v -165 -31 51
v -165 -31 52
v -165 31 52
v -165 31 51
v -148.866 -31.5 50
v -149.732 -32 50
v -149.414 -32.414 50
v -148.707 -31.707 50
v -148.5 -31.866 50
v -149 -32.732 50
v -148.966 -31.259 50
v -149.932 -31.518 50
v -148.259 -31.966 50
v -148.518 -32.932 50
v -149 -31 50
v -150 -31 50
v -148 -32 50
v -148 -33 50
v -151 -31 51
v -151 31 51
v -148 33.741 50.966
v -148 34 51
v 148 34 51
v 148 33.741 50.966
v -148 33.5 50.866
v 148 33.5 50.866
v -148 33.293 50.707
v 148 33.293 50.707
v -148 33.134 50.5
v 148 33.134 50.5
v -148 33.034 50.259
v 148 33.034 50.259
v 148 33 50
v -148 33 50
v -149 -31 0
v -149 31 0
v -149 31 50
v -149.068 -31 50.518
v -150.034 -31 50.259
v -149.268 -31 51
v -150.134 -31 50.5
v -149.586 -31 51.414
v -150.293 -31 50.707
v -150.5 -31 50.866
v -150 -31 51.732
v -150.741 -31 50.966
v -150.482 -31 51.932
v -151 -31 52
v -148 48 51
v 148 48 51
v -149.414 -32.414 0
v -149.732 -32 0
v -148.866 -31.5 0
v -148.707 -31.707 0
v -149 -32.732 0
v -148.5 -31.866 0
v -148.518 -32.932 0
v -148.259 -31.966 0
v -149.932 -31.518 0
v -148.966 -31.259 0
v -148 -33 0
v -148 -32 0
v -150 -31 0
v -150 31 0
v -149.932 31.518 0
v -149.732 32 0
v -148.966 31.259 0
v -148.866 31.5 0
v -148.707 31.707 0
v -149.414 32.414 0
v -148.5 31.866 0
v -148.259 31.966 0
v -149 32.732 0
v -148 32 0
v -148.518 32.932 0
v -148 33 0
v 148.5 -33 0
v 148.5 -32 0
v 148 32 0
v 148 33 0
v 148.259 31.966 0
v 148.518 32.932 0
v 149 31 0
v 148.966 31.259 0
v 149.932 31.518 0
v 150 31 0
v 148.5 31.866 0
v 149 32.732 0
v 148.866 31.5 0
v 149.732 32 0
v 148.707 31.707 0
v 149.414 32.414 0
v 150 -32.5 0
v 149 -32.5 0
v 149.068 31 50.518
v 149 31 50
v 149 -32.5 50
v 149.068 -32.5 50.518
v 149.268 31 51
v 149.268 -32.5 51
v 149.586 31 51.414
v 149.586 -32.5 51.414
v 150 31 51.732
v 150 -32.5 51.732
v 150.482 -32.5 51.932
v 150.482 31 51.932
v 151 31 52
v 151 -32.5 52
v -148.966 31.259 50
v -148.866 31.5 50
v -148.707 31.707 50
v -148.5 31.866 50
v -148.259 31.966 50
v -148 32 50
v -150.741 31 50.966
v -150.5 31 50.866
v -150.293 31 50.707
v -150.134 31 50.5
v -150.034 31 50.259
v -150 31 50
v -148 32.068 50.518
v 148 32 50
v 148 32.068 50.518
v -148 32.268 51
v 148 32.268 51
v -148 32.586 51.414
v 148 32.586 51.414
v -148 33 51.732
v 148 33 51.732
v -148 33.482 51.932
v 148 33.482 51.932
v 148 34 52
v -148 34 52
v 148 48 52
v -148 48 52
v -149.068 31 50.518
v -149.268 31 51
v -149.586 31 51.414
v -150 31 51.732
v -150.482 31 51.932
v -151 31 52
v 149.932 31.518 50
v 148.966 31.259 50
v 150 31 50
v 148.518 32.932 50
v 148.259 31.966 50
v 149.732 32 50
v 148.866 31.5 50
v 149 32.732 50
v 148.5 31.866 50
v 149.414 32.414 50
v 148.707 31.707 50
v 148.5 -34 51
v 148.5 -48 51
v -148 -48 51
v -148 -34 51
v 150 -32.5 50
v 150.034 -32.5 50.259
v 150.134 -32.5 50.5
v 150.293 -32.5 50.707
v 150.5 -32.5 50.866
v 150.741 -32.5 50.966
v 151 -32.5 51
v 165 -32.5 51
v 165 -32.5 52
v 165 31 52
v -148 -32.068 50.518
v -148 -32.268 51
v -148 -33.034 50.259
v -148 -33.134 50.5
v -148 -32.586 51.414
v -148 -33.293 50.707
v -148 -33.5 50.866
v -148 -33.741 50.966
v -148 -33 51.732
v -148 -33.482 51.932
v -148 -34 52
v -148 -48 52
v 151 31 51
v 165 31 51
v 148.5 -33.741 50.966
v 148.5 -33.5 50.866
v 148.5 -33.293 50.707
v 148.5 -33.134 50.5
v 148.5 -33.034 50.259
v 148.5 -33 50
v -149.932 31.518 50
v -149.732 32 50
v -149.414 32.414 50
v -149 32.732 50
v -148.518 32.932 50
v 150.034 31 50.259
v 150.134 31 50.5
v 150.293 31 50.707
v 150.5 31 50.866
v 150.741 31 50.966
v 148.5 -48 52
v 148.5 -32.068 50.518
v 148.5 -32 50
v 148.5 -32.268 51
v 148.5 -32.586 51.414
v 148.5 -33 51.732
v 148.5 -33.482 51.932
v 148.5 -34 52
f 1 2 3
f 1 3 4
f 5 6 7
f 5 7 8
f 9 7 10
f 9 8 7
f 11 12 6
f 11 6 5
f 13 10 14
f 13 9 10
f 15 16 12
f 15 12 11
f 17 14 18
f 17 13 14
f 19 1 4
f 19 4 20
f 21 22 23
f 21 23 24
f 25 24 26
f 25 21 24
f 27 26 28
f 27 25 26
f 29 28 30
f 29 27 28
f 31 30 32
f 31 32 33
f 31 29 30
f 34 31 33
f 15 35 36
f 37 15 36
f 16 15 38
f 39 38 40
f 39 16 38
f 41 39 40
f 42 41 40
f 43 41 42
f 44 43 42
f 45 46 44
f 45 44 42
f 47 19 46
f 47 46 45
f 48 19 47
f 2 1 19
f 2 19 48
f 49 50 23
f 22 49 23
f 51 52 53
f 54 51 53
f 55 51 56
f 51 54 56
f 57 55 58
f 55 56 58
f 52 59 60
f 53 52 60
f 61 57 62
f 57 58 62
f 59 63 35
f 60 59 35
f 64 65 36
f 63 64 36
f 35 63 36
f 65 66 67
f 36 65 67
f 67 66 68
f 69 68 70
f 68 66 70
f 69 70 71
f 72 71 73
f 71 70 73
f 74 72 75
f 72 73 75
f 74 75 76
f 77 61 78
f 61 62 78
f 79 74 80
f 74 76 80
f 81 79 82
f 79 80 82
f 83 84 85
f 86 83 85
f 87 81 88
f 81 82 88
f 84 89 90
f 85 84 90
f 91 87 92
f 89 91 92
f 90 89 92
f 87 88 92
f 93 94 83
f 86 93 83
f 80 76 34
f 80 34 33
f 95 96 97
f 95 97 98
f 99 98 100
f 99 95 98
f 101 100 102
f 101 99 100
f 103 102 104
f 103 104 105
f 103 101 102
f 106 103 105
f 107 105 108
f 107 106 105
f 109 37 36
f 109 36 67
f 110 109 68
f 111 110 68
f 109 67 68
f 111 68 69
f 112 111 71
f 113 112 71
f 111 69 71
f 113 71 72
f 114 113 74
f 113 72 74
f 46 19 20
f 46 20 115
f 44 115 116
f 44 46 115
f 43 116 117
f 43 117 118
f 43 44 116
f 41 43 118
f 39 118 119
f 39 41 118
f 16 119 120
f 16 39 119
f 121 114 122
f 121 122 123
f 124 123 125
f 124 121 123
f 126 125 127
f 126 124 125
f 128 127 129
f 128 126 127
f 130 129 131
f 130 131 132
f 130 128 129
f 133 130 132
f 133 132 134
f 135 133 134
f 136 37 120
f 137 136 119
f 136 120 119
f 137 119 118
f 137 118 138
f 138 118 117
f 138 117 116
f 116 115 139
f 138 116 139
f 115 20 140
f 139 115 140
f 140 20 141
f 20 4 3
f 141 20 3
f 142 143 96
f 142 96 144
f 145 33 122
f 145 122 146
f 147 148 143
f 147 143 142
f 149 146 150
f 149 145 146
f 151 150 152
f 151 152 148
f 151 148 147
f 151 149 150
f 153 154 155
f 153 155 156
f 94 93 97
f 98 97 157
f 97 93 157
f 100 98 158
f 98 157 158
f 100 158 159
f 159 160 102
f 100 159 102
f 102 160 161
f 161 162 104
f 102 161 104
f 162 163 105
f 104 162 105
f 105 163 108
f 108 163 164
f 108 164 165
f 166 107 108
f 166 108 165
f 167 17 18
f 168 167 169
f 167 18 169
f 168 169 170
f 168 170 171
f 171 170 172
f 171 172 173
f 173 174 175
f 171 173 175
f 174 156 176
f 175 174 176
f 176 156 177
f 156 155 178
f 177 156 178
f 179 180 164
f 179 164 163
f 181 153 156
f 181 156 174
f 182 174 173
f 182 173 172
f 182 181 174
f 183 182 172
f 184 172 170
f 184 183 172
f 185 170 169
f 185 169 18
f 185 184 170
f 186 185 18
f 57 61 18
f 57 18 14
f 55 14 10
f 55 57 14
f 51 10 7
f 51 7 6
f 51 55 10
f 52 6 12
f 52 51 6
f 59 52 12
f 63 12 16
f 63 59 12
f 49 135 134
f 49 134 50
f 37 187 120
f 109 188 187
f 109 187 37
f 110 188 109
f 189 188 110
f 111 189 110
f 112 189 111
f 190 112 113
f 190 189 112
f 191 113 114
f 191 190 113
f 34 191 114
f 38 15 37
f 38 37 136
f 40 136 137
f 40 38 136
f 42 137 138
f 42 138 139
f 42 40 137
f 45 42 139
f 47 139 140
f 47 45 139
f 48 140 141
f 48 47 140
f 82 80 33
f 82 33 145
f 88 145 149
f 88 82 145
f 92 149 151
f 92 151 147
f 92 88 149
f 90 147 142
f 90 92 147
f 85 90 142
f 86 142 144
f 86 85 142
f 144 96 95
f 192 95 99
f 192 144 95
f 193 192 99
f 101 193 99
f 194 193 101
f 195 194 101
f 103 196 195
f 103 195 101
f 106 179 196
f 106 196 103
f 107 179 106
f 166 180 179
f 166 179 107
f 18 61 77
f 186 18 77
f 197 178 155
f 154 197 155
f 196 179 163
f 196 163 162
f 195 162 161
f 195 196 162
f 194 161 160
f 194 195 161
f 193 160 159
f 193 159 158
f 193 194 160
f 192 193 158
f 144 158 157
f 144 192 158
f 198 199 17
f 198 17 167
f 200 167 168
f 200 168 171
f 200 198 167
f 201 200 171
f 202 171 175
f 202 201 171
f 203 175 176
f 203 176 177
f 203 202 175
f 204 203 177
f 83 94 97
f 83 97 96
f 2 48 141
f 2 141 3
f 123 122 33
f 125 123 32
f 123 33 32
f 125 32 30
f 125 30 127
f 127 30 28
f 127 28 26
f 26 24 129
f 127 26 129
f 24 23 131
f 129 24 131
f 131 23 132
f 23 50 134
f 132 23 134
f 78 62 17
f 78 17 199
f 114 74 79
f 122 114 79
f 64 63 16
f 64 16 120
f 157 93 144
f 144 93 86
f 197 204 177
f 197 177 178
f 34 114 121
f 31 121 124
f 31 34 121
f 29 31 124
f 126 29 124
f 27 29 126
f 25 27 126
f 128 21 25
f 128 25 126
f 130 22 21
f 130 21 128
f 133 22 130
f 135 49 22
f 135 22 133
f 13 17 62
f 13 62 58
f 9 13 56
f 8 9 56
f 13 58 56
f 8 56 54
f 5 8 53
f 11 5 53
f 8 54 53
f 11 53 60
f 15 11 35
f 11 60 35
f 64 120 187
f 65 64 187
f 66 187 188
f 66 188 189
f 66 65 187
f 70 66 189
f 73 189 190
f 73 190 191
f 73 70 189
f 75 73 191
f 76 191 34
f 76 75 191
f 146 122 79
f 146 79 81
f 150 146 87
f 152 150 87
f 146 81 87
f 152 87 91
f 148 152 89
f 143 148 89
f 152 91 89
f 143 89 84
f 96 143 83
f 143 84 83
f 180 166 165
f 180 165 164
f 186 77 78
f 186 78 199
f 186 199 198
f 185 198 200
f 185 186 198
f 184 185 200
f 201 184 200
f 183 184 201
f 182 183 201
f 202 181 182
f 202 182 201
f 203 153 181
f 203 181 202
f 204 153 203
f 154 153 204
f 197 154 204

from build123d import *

# Parameters (mm, degrees)
SKETCH1_W                 = 300
SKETCH1_H                 = 66
SKETCH1_W_2               = 298
SKETCH1_H_2               = 64
BOSS_EXTRUDE1_DEPTH       = 50
CONVERT_SOLID1_DEPTH      = 50
CONVERT_SOLID1_2_DEPTH    = 50
EDGE_FLANGE1_DEPTH        = 296
EDGE_FLANGE1_BEND_DEPTH   = 63.5
EDGE_FLANGE1_BEND_2_DEPTH = 296.5
EDGE_FLANGE1_BEND_3_DEPTH = 62


# Read off the part's stored shape, not the designer's step: Convert-Solid1
# Sheet-metal steps are written as plain solids
with BuildPart() as part:
    # Sketch1 → Boss-Extrude1 (new body)
    with BuildSketch(Plane.XY):
        Rectangle(SKETCH1_W, SKETCH1_H)
        Rectangle(SKETCH1_W_2, SKETCH1_H_2, mode=Mode.SUBTRACT)
    extrude(amount=BOSS_EXTRUDE1_DEPTH)

    # Convert-Solid1 outline → Convert-Solid1 (cut)
    with BuildSketch(Plane.XY):
        Polygon((149, -32.5), (149, -32), (148.5, -32), (148.5, -33), (150, -33), (150, -32.5), align=None)
        with BuildLine():
            ThreePointArc((148, 33), (149.414213562, 32.414213562), (150, 31))
            Line((150, 31), (150, 33))
            Line((150, 33), (148, 33))
        make_face()
        with BuildLine():
            Line((-150, -33), (-148, -33))
            ThreePointArc((-148, -33), (-149.414213562, -32.414213562), (-150, -31))
            Line((-150, -31), (-150, -33))
        make_face()
        with BuildLine():
            ThreePointArc((-150, 31), (-149.414213562, 32.414213562), (-148, 33))
            Line((-148, 33), (-150, 33))
            Line((-150, 33), (-150, 31))
        make_face()
    extrude(amount=CONVERT_SOLID1_DEPTH, mode=Mode.SUBTRACT)

    # Convert-Solid1 2 outline → Convert-Solid1 2 (add)
    with BuildSketch(Plane.XY):
        with BuildLine():
            ThreePointArc((148, 32), (148.707106781, 31.707106781), (149, 31))
            Line((149, 31), (149, 32))
            Line((149, 32), (148, 32))
        make_face()
        with BuildLine():
            ThreePointArc((-149, 31), (-148.707106781, 31.707106781), (-148, 32))
            Line((-148, 32), (-149, 32))
            Line((-149, 32), (-149, 31))
        make_face()
        with BuildLine():
            Line((-149, -32), (-148, -32))
            ThreePointArc((-148, -32), (-148.707106781, -31.707106781), (-149, -31))
            Line((-149, -31), (-149, -32))
        make_face()
    extrude(amount=CONVERT_SOLID1_2_DEPTH)

    # Edge-Flange1 section (across the edge) → Edge-Flange1 (add)
    with BuildSketch(Plane(origin=(-148, 33, 51), x_dir=(0, 0, -1), z_dir=(1, 0, 0))):
        with BuildLine():
            Line((-1, 1), (-1, 15))
            Line((-1, 15), (0, 15))
            Line((0, 15), (0, 1))
            ThreePointArc((0, 1), (0.292893219, 0.292893219), (1, 0))
            Line((1, 0), (1, -1))
            ThreePointArc((1, -1), (-0.414213562, -0.414213562), (-1, 1))
        make_face()
    extrude(amount=EDGE_FLANGE1_DEPTH)

    # Edge-Flange1 section 2 (across the edge) → Edge-Flange1 bend (add)
    with BuildSketch(Plane(origin=(150, 31, 51), x_dir=(0, 0, -1), z_dir=(0, -1, 0))):
        with BuildLine():
            Line((-1, 1), (-1, 15))
            Line((-1, 15), (0, 15))
            Line((0, 15), (0, 1))
            ThreePointArc((0, 1), (0.292893219, 0.292893219), (1, 0))
            Line((1, 0), (1, -1))
            ThreePointArc((1, -1), (-0.414213562, -0.414213562), (-1, 1))
        make_face()
    extrude(amount=EDGE_FLANGE1_BEND_DEPTH)

    # Edge-Flange1 section 3 (across the edge) → Edge-Flange1 bend 2 (add)
    with BuildSketch(Plane(origin=(148.5, -33, 51), x_dir=(0, 0, -1), z_dir=(-1, 0, 0))):
        with BuildLine():
            Line((-1, 1), (-1, 15))
            Line((-1, 15), (0, 15))
            Line((0, 15), (0, 1))
            ThreePointArc((0, 1), (0.292893219, 0.292893219), (1, 0))
            Line((1, 0), (1, -1))
            ThreePointArc((1, -1), (-0.414213562, -0.414213562), (-1, 1))
        make_face()
    extrude(amount=EDGE_FLANGE1_BEND_2_DEPTH)

    # Edge-Flange1 section 4 (across the edge) → Edge-Flange1 bend 3 (add)
    with BuildSketch(Plane(origin=(-150, -31, 51), x_dir=(0, 0, -1), z_dir=(0, 1, 0))):
        with BuildLine():
            Line((-1, 1), (-1, 15))
            Line((-1, 15), (0, 15))
            Line((0, 15), (0, 1))
            ThreePointArc((0, 1), (0.292893219, 0.292893219), (1, 0))
            Line((1, 0), (1, -1))
            ThreePointArc((1, -1), (-0.414213562, -0.414213562), (-1, 1))
        make_face()
    extrude(amount=EDGE_FLANGE1_BEND_3_DEPTH)


solid = part.part
